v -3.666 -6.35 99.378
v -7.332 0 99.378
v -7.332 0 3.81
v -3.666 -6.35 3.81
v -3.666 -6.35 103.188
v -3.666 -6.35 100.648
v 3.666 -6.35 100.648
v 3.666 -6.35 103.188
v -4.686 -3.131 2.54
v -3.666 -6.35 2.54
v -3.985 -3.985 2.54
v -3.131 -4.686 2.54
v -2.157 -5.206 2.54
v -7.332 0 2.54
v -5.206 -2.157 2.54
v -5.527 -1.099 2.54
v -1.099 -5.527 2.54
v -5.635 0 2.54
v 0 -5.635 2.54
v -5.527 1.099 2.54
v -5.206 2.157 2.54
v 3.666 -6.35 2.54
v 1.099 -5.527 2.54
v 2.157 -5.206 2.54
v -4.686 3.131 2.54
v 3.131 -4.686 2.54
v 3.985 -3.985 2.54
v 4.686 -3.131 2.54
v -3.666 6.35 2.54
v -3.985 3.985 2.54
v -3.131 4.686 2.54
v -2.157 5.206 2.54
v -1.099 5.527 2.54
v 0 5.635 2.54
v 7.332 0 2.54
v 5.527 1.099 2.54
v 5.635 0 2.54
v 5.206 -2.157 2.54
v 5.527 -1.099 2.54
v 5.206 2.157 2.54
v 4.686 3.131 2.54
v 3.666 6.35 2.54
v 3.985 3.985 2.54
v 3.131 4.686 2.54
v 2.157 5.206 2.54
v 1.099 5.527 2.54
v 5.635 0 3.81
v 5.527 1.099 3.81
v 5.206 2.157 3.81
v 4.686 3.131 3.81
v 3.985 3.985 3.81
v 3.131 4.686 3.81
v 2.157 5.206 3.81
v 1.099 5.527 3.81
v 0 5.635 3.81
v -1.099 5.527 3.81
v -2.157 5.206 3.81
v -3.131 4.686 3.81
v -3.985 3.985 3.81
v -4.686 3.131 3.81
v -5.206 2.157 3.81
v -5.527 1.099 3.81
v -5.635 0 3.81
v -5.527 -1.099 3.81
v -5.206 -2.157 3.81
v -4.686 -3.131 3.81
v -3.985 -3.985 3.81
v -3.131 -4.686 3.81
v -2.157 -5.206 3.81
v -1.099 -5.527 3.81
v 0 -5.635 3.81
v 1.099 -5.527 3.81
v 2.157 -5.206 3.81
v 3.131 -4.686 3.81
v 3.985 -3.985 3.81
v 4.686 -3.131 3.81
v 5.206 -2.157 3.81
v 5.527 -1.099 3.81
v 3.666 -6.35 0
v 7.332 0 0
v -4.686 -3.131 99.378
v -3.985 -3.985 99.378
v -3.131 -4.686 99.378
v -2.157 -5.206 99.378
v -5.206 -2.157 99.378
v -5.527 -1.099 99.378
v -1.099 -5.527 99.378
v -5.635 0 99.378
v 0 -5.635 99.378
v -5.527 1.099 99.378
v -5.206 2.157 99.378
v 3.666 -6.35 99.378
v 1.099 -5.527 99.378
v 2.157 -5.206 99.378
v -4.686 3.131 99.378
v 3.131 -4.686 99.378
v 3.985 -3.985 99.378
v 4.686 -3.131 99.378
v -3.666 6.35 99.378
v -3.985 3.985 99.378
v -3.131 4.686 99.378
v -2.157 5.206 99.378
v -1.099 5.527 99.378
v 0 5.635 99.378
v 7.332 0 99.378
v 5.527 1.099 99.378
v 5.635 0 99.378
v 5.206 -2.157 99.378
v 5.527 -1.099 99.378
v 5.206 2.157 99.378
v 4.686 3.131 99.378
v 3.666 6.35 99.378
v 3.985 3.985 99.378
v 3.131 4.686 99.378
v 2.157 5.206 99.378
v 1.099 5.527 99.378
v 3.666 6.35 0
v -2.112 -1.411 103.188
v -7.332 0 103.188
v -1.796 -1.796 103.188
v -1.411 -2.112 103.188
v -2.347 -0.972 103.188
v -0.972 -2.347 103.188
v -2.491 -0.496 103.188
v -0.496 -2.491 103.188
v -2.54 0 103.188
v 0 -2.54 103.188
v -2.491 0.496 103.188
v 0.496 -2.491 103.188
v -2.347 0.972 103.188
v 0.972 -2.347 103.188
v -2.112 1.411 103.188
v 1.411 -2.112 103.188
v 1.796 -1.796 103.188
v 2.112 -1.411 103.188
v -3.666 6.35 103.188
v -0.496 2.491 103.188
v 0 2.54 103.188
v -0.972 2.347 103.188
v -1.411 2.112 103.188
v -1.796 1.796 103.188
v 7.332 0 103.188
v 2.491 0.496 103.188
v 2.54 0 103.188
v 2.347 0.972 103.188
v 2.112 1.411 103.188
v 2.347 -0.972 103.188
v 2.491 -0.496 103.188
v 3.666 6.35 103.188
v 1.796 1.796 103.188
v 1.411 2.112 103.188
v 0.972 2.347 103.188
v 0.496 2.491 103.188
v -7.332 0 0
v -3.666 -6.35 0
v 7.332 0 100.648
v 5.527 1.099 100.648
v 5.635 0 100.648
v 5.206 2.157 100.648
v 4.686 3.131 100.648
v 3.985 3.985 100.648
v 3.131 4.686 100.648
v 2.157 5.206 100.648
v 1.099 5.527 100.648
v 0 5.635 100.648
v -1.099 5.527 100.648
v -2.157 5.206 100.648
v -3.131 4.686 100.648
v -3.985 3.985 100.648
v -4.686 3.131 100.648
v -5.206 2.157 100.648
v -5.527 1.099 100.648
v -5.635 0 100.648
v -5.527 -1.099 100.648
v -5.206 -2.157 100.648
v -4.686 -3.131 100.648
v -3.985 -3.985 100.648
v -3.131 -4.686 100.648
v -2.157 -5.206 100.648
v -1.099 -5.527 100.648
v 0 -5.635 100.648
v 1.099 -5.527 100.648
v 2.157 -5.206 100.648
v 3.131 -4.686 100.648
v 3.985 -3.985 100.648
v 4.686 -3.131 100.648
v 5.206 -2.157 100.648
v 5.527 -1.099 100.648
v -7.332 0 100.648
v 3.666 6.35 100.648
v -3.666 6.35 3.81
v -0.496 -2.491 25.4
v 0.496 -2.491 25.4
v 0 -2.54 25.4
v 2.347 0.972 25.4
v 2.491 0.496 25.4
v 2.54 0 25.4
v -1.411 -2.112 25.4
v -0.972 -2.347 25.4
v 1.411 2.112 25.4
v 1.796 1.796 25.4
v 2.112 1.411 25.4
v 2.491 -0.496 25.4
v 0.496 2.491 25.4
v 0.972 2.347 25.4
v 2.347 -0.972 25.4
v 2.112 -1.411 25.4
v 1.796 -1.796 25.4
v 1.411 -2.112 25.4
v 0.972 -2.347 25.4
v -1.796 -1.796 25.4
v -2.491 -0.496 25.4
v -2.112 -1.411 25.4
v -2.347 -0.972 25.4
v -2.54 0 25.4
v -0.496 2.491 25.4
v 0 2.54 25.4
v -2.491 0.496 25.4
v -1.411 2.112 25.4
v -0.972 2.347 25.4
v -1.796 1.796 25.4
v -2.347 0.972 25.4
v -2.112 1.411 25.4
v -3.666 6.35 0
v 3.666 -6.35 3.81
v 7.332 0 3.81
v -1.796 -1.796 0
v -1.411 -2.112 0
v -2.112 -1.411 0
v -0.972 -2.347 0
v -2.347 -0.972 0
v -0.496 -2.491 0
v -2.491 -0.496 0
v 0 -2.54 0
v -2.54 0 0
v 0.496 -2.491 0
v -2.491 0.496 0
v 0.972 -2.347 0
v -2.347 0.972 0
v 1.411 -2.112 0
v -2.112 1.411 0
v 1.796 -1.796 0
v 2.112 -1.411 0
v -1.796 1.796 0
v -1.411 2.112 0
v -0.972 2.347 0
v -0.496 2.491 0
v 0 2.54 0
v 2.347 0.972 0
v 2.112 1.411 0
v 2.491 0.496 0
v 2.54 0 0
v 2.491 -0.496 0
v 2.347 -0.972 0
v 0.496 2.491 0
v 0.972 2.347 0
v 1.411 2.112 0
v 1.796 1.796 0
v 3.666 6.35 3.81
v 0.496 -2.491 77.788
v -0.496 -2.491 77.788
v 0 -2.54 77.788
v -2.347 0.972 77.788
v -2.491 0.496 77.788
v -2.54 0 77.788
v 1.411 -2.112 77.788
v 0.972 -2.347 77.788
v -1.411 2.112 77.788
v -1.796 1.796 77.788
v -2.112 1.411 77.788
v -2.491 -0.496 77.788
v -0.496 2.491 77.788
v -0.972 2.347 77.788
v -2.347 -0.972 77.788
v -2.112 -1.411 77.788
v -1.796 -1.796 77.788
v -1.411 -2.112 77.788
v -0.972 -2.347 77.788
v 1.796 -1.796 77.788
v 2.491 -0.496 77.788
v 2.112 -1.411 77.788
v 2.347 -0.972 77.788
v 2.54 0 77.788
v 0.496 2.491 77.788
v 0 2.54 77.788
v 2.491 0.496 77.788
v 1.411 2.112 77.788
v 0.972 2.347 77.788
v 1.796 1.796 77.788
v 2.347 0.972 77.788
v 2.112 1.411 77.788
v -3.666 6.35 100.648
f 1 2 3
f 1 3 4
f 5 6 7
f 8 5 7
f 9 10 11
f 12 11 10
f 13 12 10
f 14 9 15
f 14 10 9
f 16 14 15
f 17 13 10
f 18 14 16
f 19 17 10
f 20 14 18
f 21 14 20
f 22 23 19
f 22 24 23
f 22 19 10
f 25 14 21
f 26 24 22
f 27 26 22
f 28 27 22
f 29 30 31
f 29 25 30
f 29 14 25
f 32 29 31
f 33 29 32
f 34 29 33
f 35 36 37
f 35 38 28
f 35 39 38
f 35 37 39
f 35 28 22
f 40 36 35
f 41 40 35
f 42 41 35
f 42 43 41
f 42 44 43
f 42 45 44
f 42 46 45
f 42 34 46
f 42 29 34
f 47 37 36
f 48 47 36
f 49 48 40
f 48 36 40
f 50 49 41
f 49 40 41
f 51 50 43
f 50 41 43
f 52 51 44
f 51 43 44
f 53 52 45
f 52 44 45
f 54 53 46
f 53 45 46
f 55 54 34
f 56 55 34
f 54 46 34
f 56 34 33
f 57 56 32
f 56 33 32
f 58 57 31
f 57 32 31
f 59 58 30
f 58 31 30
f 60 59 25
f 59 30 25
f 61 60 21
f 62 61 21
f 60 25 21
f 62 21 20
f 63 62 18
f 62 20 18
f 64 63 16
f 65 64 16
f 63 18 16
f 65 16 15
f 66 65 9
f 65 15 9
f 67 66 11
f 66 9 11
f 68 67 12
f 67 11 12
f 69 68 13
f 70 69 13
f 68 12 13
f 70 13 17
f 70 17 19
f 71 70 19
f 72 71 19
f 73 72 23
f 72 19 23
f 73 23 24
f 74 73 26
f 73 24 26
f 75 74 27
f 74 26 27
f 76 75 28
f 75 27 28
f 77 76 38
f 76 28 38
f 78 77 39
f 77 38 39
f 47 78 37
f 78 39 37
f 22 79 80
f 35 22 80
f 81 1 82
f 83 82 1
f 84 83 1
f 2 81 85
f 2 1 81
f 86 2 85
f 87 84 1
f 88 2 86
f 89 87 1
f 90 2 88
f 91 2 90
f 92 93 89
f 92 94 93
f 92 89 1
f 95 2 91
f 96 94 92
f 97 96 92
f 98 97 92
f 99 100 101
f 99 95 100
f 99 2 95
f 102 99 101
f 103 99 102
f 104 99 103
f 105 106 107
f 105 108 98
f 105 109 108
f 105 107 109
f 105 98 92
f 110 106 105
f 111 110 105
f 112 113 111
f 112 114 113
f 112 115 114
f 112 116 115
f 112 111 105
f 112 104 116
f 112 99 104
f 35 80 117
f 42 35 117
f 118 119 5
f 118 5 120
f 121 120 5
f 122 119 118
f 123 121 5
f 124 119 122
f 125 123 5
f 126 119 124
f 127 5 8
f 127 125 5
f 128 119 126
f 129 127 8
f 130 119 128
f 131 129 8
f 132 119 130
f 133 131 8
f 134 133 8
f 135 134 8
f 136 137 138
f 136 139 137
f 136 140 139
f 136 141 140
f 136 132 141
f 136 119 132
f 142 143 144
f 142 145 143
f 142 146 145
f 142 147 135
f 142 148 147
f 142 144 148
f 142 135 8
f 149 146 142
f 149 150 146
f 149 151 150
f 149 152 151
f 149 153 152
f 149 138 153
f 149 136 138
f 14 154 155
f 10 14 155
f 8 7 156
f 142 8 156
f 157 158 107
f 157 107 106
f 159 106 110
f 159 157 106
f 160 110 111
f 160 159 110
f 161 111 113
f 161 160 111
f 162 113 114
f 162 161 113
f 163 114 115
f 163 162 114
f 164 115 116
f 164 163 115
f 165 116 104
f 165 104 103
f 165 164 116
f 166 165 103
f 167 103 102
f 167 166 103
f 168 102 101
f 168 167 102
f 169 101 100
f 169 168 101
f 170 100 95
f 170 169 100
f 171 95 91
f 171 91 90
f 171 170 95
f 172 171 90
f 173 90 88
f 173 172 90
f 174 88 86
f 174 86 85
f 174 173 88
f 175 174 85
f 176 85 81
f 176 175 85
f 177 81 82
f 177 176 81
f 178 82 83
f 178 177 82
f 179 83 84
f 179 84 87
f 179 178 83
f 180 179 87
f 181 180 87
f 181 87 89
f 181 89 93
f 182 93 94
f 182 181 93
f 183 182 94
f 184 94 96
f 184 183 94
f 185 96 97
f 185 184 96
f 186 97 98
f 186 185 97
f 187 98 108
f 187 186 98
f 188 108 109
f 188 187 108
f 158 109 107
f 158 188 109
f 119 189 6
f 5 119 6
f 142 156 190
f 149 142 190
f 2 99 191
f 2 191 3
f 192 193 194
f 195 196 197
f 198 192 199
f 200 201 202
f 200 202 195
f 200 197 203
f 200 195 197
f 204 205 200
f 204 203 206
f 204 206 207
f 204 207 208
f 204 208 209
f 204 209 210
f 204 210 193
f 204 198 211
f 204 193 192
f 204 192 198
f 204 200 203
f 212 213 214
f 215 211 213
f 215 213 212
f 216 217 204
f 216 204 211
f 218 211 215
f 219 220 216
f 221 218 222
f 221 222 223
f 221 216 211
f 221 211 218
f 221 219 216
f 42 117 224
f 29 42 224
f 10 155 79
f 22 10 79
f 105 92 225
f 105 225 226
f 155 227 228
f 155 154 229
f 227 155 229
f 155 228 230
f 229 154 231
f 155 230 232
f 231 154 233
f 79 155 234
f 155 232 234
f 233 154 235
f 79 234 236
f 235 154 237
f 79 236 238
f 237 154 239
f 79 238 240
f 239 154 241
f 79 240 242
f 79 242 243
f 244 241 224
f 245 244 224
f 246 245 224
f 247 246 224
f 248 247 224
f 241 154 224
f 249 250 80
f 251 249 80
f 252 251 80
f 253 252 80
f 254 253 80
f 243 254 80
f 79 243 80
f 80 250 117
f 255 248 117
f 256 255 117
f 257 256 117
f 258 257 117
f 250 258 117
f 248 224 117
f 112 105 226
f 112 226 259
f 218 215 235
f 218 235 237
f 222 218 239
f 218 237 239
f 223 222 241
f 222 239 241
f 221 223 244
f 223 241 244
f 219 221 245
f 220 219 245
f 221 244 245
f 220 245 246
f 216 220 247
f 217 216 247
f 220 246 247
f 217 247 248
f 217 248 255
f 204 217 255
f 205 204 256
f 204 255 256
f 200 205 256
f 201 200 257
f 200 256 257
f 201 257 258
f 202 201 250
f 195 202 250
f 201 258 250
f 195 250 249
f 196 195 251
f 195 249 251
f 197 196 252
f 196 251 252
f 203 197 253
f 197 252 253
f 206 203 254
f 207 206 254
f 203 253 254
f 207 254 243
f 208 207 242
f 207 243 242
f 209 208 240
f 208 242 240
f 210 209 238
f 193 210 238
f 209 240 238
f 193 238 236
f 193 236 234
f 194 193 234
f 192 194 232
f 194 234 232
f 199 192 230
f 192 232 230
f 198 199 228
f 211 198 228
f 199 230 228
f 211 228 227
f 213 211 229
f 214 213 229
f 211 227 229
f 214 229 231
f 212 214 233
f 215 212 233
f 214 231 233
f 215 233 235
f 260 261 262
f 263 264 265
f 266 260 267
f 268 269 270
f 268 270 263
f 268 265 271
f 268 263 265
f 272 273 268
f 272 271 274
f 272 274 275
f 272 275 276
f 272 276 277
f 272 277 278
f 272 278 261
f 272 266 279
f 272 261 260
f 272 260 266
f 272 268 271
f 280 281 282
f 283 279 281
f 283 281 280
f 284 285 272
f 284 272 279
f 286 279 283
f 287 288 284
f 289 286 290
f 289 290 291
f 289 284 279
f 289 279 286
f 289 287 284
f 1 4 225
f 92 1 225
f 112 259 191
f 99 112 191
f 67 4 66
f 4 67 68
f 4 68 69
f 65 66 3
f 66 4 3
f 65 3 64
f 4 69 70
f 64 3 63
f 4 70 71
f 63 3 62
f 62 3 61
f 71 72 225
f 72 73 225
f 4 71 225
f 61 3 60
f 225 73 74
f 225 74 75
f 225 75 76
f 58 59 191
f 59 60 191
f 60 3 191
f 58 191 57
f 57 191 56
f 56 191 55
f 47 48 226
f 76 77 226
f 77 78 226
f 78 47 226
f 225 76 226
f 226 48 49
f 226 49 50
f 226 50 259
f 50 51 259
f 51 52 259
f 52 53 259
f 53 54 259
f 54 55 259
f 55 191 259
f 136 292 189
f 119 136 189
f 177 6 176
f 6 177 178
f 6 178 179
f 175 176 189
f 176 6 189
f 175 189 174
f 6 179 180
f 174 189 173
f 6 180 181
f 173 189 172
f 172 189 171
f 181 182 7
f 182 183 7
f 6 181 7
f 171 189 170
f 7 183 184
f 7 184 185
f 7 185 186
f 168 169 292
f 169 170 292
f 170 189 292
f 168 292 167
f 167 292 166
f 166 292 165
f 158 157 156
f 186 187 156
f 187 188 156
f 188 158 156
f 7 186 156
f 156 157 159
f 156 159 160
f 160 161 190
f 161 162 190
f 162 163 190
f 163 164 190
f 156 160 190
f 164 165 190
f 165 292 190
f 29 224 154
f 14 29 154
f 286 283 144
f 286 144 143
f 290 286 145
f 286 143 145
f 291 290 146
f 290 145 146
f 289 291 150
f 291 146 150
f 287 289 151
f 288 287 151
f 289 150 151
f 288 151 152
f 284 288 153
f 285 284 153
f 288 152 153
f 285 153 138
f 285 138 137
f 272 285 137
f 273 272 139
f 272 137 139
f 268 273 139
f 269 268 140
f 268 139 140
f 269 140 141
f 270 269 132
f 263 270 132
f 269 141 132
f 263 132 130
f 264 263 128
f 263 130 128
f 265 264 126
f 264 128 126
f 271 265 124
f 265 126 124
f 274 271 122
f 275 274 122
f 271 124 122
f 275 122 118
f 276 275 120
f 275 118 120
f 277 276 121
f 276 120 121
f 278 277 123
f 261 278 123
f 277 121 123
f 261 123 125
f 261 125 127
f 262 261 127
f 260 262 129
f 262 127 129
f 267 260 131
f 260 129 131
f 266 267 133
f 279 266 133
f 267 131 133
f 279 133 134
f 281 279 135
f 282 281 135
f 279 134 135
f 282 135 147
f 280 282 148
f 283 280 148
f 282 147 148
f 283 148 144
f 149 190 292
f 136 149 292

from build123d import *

# Parameters (mm, degrees)
BOSS_EXTRUDE1_DEPTH = 103.1875
SKETCH2_R           = 9.90966703
SKETCH2_R_2         = 5.635297177
CUT_EXTRUDE1_DEPTH  = 1.27
SKETCH3_R           = 2.54
CUT_EXTRUDE2_DEPTH  = 25.4
CUT_EXTRUDE3_START  = -1.27
SKETCH4_R           = 26.134229338
SKETCH4_R_2         = 5.635297177
CUT_EXTRUDE3_DEPTH  = 1.27
CUT_EXTRUDE4_START  = -25.4
SKETCH5_R           = 2.54
CUT_EXTRUDE4_DEPTH  = 25.4


with BuildPart() as part:
    # Sketch1 → Boss-Extrude1 (new body)
    with BuildSketch(Plane.XY):
        Polygon((7.332348419, 0), (3.666174209, 6.35), (-3.666174209, 6.35), (-7.332348419, 0), (-3.666174209, -6.35), (3.666174209, -6.35), align=None)
    extrude(amount=BOSS_EXTRUDE1_DEPTH)

    # Sketch2 → Cut-Extrude1 (cut)
    with BuildSketch(Plane.XY.offset(2.54)):
        Circle(SKETCH2_R)
        Circle(SKETCH2_R_2, mode=Mode.SUBTRACT)
    extrude(amount=CUT_EXTRUDE1_DEPTH, mode=Mode.SUBTRACT)

    # Sketch3 → Cut-Extrude2 (cut)
    with BuildSketch(Plane(origin=(0, 0, 0), x_dir=(-1, 0, 0), z_dir=(0, 0, -1))):
        Circle(SKETCH3_R)
    extrude(amount=-CUT_EXTRUDE2_DEPTH, mode=Mode.SUBTRACT)

    # Sketch4 → Cut-Extrude3 (cut)
    with BuildSketch(Plane.XY.offset(100.6475).offset(CUT_EXTRUDE3_START)):
        Circle(SKETCH4_R)
        Circle(SKETCH4_R_2, mode=Mode.SUBTRACT)
    extrude(amount=CUT_EXTRUDE3_DEPTH, mode=Mode.SUBTRACT)

    # Sketch5 → Cut-Extrude4 (cut)
    with BuildSketch(Plane.XY.offset(103.1875).offset(CUT_EXTRUDE4_START)):
        Circle(SKETCH5_R)
    extrude(amount=CUT_EXTRUDE4_DEPTH, mode=Mode.SUBTRACT)


solid = part.part
